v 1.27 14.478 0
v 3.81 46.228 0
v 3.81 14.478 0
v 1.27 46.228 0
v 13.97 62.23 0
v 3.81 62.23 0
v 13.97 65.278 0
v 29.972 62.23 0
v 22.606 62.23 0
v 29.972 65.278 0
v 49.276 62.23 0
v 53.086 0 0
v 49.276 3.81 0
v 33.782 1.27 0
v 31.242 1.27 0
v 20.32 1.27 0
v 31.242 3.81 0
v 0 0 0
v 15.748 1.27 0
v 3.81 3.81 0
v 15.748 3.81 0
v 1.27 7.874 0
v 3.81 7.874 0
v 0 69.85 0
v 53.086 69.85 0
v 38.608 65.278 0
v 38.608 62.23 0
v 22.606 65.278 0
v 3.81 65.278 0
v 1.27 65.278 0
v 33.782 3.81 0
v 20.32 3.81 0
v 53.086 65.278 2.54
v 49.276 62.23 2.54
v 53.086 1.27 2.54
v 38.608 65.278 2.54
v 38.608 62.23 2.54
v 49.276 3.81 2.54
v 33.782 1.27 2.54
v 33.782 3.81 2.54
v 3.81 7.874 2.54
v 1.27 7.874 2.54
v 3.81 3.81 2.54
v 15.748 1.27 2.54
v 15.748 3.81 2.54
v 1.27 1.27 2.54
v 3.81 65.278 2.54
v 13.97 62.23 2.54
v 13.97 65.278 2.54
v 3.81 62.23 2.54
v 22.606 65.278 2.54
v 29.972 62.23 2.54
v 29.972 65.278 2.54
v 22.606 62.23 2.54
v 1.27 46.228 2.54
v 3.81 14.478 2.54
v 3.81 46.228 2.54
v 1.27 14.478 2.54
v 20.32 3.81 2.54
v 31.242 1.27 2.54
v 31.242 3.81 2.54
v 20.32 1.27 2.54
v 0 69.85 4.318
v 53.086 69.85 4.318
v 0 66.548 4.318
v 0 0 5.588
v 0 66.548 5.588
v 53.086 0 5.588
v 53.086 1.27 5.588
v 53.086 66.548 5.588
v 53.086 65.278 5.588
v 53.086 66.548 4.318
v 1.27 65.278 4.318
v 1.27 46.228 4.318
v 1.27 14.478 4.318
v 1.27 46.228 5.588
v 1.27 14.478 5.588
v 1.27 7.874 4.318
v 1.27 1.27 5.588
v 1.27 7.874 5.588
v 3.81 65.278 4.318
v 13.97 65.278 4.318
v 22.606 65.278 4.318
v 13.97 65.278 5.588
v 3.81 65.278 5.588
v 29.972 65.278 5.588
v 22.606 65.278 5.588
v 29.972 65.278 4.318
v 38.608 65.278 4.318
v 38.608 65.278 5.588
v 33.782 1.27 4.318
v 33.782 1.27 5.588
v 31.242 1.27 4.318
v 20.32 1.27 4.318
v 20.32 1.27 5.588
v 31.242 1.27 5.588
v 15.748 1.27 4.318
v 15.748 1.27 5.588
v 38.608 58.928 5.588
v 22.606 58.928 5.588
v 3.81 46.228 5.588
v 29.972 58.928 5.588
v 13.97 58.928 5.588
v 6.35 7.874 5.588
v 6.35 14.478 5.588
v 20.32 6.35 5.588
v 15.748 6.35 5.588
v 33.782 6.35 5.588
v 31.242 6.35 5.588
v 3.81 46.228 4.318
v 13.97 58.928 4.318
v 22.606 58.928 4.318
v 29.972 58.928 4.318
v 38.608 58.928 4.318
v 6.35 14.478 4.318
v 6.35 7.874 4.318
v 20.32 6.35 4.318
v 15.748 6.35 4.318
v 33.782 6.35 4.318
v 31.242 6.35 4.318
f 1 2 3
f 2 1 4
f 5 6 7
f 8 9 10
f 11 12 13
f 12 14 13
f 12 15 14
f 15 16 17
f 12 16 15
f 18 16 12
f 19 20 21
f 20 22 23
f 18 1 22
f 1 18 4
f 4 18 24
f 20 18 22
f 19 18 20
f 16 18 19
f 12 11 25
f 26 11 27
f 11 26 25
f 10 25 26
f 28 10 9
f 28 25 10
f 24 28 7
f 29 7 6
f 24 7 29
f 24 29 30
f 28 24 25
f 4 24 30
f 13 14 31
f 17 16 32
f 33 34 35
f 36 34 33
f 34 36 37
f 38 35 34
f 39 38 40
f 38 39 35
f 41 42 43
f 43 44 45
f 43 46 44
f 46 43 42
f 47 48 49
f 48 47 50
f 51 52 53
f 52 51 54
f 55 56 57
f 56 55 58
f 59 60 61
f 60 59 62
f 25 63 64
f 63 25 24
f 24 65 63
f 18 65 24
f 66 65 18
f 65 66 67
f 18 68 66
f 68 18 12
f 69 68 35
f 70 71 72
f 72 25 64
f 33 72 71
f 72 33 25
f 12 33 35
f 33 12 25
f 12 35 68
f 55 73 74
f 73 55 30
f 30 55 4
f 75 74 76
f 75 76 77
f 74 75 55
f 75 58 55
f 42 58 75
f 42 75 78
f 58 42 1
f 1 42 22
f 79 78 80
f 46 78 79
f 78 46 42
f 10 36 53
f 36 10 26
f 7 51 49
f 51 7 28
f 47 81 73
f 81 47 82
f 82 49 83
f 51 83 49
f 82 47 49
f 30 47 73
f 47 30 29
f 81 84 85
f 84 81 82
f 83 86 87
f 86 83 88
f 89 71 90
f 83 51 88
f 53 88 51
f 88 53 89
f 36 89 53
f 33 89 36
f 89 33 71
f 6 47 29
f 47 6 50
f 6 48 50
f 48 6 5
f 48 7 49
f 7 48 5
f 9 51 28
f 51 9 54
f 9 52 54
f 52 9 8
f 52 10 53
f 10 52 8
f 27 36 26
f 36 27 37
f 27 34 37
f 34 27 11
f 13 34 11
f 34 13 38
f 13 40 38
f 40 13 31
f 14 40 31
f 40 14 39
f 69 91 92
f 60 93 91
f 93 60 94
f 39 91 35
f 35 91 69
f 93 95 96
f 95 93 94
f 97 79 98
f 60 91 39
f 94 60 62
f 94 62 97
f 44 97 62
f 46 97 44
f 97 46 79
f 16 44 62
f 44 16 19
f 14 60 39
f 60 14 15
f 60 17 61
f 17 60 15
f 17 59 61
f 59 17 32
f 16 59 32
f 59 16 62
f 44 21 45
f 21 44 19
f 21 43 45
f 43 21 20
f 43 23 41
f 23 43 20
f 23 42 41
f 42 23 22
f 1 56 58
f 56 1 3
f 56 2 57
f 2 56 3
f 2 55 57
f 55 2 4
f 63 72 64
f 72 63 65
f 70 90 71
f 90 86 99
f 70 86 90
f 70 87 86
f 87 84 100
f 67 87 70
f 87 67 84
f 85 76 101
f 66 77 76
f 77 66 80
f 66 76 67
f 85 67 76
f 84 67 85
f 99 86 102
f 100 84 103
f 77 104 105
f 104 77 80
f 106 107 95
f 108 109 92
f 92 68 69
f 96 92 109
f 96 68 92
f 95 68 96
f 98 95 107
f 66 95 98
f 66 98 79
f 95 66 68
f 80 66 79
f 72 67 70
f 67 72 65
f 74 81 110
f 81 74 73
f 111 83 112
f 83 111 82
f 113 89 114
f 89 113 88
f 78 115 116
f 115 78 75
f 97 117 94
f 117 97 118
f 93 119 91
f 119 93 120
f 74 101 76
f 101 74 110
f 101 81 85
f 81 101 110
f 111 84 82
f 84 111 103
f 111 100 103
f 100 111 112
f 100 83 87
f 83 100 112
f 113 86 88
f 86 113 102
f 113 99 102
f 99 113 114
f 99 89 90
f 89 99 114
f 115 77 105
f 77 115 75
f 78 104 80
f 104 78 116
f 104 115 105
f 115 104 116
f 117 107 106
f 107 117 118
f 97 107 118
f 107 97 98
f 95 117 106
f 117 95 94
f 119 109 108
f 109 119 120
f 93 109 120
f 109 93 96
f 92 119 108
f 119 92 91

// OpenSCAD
ViewScale = [0.0254, 0.0254, 0.0254];

module tabs()
{
    // right tabs - top 
    translate([50, 2620-750-50, 0])
    square([100, 750]);
    translate([50+500, 2620-250-50, 0])
    square([340, 250]);
    translate([50+1130, 2620-250-50, 0])
    square([340, 250]);

    // left tabs - top
    translate([50, 50+260, 0])
    square([200, 260]);
    translate([50+570, 50, 0])
    square([180, 200]);
    translate([50+1180, 50, 0])
    square([100, 200]);
}

module bms()
{
    linear_extrude(100)
    difference() {
    square([1990+100, 2750]);
    translate([150, 150, 0])
    square([1790, 2300]); 
    tabs();
    }

    translate([0, 0, 100])
    linear_extrude(70)
    difference() {
    square([1990+100, 2750]);
    translate([50, 50, 0])
    square([2100, 2520]); }

    translate([0, 0, 170])
    linear_extrude(50)
    difference() {
    square([1990+100, 2500+120]);
    translate([50, 50, 0])
    square([2100, 2520]); }


}


scale(ViewScale)
{
    bms();
    translate([0, 0, 170])
    linear_extrude(50)
    tabs();
}
